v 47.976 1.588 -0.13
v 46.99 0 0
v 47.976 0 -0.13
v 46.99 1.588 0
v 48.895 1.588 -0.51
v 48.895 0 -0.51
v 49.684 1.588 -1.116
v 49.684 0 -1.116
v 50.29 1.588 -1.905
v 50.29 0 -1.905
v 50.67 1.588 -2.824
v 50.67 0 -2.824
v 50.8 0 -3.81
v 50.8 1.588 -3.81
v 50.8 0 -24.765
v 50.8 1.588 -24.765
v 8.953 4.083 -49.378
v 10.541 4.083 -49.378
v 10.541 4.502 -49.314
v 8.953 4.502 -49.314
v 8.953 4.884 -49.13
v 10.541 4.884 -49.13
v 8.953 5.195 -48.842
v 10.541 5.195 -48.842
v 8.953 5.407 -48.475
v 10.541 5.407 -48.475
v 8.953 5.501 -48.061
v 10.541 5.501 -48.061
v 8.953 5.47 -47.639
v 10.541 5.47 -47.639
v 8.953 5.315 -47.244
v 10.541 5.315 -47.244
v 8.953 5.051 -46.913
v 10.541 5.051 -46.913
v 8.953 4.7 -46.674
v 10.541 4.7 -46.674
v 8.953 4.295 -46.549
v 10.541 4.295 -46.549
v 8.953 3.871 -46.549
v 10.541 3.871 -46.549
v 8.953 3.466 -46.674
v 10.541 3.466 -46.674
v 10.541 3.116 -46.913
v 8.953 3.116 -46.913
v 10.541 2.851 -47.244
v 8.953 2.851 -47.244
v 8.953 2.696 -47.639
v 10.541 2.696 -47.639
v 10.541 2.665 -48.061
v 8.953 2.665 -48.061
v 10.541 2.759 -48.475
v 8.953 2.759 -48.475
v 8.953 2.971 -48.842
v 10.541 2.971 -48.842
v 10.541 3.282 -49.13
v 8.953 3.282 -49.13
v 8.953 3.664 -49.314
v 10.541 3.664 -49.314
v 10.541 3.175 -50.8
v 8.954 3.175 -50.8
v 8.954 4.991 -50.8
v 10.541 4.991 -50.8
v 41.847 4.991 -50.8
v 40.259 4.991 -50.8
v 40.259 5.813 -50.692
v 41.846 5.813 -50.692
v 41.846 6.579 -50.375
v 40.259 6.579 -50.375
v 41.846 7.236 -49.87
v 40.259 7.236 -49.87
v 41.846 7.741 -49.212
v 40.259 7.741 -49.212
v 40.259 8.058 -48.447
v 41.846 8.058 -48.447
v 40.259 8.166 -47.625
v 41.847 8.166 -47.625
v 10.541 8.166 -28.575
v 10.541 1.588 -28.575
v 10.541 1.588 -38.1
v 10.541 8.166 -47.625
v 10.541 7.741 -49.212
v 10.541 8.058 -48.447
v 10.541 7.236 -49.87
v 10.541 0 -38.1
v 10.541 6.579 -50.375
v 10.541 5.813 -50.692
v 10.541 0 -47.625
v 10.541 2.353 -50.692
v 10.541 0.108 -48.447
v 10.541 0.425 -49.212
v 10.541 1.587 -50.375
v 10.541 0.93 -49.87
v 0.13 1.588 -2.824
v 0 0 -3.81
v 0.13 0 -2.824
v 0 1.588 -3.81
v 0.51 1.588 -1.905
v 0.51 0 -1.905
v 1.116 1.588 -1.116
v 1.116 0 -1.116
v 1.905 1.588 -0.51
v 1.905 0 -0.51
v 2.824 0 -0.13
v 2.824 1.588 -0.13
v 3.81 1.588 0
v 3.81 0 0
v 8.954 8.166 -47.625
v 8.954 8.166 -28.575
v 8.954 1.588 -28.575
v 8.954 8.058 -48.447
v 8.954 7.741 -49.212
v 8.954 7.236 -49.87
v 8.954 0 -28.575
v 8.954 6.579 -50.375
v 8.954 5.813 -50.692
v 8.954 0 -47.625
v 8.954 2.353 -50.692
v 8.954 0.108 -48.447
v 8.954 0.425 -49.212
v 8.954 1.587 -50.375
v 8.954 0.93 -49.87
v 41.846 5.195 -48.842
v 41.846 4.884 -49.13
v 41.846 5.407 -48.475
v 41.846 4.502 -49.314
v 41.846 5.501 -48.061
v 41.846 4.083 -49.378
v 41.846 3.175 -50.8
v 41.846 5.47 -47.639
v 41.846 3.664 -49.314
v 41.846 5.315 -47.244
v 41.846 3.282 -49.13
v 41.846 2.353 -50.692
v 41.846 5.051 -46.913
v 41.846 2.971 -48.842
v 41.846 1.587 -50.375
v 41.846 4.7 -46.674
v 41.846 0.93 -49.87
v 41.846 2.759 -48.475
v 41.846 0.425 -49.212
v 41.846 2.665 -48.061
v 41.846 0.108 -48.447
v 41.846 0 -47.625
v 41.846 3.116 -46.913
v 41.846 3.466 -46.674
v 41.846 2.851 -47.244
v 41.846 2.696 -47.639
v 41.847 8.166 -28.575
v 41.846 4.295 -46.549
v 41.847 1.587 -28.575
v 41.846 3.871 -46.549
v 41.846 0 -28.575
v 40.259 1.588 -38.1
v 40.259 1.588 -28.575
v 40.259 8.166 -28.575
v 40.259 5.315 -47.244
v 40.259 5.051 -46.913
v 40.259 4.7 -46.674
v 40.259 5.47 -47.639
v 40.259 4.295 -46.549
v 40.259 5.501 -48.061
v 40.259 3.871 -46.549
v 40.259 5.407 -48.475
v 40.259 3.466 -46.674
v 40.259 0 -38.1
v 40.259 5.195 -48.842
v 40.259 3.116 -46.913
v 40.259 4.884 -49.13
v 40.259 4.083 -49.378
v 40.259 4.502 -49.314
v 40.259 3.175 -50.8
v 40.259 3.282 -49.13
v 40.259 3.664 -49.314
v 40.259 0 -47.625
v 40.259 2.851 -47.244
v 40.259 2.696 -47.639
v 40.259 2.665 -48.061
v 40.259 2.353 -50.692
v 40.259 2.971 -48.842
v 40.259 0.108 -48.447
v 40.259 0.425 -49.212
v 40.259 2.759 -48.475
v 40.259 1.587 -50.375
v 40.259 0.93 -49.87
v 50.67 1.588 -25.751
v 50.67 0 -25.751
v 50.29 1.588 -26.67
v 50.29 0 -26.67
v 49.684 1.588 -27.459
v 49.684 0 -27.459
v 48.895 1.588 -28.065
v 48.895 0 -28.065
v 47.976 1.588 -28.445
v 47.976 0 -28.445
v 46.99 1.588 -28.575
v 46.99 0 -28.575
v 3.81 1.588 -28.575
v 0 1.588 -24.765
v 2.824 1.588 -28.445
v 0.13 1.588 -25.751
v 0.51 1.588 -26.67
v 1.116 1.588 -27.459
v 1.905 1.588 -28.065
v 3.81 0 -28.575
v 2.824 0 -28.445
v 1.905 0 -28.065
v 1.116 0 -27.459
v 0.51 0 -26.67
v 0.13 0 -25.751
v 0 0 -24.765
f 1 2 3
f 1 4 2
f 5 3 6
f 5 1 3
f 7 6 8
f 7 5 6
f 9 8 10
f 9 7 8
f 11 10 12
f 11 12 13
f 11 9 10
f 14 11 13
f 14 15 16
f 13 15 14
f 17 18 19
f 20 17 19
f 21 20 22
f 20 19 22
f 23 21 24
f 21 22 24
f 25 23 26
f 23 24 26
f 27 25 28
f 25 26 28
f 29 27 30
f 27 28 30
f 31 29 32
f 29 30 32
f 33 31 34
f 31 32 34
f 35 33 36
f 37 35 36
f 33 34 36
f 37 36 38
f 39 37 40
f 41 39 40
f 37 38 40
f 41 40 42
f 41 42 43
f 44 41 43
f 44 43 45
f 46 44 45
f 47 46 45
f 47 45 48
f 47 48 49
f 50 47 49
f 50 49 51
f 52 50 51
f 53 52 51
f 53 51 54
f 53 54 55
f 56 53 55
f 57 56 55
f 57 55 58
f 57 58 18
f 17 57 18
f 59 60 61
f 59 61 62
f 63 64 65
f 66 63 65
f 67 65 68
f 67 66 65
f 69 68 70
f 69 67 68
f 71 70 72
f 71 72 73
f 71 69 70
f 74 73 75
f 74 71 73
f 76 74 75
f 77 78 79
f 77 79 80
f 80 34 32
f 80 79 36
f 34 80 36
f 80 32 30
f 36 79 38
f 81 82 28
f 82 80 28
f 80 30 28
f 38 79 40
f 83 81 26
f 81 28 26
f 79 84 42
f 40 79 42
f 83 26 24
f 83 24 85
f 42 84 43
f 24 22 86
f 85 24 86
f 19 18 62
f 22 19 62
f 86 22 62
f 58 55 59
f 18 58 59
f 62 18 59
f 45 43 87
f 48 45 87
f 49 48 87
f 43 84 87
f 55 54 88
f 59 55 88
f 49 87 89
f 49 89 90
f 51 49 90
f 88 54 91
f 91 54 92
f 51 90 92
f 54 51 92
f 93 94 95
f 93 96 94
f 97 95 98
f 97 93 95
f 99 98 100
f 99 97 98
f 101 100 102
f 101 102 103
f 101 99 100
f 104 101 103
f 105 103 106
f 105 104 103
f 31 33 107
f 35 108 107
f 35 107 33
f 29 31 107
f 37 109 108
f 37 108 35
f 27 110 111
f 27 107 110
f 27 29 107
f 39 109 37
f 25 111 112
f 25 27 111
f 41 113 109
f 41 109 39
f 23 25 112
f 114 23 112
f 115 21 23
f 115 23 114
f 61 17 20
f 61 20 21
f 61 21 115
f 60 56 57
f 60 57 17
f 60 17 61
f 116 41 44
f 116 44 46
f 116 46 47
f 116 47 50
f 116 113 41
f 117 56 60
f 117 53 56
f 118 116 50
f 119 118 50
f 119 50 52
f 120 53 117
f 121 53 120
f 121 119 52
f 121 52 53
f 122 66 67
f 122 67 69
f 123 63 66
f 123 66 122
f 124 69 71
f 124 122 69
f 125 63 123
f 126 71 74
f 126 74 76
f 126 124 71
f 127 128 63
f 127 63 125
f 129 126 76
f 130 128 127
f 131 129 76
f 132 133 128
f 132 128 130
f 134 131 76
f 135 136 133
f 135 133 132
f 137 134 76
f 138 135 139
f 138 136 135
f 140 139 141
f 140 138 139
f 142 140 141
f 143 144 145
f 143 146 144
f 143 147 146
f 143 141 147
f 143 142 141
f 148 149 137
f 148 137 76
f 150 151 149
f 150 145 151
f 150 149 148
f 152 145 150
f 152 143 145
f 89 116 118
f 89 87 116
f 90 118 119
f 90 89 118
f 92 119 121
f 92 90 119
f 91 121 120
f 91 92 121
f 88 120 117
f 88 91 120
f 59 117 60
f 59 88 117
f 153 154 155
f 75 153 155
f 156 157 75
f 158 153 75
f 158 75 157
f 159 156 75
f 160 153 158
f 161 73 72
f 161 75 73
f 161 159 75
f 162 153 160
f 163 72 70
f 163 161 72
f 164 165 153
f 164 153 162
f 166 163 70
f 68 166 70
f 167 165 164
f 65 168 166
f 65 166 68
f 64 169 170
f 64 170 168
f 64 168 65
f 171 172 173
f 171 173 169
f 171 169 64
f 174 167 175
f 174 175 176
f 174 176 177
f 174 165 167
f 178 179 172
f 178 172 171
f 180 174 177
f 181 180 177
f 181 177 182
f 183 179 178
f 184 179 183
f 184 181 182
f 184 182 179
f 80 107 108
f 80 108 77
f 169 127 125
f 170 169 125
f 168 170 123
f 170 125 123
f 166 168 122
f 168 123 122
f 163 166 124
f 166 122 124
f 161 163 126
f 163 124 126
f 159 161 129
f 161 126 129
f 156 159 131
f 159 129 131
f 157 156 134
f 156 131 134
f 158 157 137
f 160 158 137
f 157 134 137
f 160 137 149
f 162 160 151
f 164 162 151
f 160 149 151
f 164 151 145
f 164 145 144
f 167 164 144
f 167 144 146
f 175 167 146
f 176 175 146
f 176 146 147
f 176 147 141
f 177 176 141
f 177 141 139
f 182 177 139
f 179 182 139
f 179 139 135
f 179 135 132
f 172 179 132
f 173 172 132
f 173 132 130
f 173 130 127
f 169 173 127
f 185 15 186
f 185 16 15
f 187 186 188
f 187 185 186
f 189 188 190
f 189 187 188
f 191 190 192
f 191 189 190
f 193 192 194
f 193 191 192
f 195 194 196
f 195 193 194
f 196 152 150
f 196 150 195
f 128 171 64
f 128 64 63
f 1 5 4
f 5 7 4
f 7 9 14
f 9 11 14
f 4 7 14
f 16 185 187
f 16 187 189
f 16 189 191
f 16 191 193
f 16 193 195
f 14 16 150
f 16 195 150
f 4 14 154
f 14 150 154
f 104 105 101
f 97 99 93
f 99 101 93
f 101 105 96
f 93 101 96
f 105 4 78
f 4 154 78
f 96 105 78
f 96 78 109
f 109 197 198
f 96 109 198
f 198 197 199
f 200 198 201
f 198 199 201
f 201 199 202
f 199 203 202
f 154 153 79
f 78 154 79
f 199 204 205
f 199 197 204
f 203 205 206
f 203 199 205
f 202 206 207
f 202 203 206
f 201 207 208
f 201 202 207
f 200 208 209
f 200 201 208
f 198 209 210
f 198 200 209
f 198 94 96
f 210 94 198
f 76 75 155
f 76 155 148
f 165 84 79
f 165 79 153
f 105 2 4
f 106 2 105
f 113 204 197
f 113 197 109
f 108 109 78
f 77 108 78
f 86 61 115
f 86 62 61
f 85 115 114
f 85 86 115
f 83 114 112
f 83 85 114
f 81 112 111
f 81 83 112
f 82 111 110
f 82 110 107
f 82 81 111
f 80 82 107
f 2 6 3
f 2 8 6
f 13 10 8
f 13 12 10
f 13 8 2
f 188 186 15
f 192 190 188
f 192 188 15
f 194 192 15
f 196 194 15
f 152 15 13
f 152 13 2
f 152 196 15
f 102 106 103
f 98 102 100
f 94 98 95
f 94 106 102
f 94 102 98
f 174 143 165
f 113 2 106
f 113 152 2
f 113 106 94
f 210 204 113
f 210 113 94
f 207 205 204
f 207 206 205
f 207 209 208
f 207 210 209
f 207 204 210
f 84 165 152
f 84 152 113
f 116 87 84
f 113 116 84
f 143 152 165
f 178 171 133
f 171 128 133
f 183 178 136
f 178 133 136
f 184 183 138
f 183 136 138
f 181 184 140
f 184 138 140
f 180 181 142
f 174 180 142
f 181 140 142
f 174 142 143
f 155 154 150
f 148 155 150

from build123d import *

# Parameters (mm, degrees)
BOSS_EXTRUDE1_DEPTH = 1.5875
SKETCH2_W           = 1.5875
SKETCH2_H           = 22.225
BOSS_EXTRUDE2_DEPTH = 6.5786
FILLET1_R           = 3.175
FILLET2_R           = 3.81
HOLE1_D             = 2.8448


with BuildPart() as part:
    # Sketch1 → Boss-Extrude1 (new body)
    with BuildSketch(Plane(origin=(0, 0, 0), x_dir=(1, 0, 0), z_dir=(0, 1, 0))):
        Polygon((8.9535, 28.575), (8.9535, 50.8), (10.541, 50.8), (10.541, 38.1), (40.259, 38.1), (40.259, 50.8), (41.8465, 50.8), (41.8465, 28.575), (50.8, 28.575), (50.8, 0), (0, 0), (0, 28.575), align=None)
    extrude(amount=BOSS_EXTRUDE1_DEPTH)

    # Sketch2 → Boss-Extrude2 (add)
    with BuildSketch(Plane(origin=(0, 1.5875, 0), x_dir=(1, 0, 0), z_dir=(0, 1, 0))):
        with Locations((9.74725, 39.6875)):
            Rectangle(SKETCH2_W, SKETCH2_H)
        with Locations((41.05275, 39.6875)):
            Rectangle(SKETCH2_W, SKETCH2_H)
    extrude(amount=BOSS_EXTRUDE2_DEPTH)

    # Fillet1
    fillet1_edges = [part.edges().sort_by_distance(p)[0] for p in [
        (9.74725, 0, -50.8),
        (41.05275, 0, -50.8),
        (9.74725, 8.1661, -50.8),
        (41.05275, 8.1661, -50.8),
    ]]
    fillet(fillet1_edges, radius=FILLET1_R)

    # Fillet2
    fillet2_edges = [part.edges().sort_by_distance(p)[0] for p in [
        (0, 0.79375, -28.575),
        (50.8, 0.79375, -28.575),
        (50.8, 0.79375, 0),
        (0, 0.79375, 0),
    ]]
    fillet(fillet2_edges, radius=FILLET2_R)

    # Hole1 (through all)
    with Locations(Plane.ZY.offset(-8.9535)):
        with Locations((-47.9552, 4.08305)):
            Hole(HOLE1_D / 2)


solid = part.part
